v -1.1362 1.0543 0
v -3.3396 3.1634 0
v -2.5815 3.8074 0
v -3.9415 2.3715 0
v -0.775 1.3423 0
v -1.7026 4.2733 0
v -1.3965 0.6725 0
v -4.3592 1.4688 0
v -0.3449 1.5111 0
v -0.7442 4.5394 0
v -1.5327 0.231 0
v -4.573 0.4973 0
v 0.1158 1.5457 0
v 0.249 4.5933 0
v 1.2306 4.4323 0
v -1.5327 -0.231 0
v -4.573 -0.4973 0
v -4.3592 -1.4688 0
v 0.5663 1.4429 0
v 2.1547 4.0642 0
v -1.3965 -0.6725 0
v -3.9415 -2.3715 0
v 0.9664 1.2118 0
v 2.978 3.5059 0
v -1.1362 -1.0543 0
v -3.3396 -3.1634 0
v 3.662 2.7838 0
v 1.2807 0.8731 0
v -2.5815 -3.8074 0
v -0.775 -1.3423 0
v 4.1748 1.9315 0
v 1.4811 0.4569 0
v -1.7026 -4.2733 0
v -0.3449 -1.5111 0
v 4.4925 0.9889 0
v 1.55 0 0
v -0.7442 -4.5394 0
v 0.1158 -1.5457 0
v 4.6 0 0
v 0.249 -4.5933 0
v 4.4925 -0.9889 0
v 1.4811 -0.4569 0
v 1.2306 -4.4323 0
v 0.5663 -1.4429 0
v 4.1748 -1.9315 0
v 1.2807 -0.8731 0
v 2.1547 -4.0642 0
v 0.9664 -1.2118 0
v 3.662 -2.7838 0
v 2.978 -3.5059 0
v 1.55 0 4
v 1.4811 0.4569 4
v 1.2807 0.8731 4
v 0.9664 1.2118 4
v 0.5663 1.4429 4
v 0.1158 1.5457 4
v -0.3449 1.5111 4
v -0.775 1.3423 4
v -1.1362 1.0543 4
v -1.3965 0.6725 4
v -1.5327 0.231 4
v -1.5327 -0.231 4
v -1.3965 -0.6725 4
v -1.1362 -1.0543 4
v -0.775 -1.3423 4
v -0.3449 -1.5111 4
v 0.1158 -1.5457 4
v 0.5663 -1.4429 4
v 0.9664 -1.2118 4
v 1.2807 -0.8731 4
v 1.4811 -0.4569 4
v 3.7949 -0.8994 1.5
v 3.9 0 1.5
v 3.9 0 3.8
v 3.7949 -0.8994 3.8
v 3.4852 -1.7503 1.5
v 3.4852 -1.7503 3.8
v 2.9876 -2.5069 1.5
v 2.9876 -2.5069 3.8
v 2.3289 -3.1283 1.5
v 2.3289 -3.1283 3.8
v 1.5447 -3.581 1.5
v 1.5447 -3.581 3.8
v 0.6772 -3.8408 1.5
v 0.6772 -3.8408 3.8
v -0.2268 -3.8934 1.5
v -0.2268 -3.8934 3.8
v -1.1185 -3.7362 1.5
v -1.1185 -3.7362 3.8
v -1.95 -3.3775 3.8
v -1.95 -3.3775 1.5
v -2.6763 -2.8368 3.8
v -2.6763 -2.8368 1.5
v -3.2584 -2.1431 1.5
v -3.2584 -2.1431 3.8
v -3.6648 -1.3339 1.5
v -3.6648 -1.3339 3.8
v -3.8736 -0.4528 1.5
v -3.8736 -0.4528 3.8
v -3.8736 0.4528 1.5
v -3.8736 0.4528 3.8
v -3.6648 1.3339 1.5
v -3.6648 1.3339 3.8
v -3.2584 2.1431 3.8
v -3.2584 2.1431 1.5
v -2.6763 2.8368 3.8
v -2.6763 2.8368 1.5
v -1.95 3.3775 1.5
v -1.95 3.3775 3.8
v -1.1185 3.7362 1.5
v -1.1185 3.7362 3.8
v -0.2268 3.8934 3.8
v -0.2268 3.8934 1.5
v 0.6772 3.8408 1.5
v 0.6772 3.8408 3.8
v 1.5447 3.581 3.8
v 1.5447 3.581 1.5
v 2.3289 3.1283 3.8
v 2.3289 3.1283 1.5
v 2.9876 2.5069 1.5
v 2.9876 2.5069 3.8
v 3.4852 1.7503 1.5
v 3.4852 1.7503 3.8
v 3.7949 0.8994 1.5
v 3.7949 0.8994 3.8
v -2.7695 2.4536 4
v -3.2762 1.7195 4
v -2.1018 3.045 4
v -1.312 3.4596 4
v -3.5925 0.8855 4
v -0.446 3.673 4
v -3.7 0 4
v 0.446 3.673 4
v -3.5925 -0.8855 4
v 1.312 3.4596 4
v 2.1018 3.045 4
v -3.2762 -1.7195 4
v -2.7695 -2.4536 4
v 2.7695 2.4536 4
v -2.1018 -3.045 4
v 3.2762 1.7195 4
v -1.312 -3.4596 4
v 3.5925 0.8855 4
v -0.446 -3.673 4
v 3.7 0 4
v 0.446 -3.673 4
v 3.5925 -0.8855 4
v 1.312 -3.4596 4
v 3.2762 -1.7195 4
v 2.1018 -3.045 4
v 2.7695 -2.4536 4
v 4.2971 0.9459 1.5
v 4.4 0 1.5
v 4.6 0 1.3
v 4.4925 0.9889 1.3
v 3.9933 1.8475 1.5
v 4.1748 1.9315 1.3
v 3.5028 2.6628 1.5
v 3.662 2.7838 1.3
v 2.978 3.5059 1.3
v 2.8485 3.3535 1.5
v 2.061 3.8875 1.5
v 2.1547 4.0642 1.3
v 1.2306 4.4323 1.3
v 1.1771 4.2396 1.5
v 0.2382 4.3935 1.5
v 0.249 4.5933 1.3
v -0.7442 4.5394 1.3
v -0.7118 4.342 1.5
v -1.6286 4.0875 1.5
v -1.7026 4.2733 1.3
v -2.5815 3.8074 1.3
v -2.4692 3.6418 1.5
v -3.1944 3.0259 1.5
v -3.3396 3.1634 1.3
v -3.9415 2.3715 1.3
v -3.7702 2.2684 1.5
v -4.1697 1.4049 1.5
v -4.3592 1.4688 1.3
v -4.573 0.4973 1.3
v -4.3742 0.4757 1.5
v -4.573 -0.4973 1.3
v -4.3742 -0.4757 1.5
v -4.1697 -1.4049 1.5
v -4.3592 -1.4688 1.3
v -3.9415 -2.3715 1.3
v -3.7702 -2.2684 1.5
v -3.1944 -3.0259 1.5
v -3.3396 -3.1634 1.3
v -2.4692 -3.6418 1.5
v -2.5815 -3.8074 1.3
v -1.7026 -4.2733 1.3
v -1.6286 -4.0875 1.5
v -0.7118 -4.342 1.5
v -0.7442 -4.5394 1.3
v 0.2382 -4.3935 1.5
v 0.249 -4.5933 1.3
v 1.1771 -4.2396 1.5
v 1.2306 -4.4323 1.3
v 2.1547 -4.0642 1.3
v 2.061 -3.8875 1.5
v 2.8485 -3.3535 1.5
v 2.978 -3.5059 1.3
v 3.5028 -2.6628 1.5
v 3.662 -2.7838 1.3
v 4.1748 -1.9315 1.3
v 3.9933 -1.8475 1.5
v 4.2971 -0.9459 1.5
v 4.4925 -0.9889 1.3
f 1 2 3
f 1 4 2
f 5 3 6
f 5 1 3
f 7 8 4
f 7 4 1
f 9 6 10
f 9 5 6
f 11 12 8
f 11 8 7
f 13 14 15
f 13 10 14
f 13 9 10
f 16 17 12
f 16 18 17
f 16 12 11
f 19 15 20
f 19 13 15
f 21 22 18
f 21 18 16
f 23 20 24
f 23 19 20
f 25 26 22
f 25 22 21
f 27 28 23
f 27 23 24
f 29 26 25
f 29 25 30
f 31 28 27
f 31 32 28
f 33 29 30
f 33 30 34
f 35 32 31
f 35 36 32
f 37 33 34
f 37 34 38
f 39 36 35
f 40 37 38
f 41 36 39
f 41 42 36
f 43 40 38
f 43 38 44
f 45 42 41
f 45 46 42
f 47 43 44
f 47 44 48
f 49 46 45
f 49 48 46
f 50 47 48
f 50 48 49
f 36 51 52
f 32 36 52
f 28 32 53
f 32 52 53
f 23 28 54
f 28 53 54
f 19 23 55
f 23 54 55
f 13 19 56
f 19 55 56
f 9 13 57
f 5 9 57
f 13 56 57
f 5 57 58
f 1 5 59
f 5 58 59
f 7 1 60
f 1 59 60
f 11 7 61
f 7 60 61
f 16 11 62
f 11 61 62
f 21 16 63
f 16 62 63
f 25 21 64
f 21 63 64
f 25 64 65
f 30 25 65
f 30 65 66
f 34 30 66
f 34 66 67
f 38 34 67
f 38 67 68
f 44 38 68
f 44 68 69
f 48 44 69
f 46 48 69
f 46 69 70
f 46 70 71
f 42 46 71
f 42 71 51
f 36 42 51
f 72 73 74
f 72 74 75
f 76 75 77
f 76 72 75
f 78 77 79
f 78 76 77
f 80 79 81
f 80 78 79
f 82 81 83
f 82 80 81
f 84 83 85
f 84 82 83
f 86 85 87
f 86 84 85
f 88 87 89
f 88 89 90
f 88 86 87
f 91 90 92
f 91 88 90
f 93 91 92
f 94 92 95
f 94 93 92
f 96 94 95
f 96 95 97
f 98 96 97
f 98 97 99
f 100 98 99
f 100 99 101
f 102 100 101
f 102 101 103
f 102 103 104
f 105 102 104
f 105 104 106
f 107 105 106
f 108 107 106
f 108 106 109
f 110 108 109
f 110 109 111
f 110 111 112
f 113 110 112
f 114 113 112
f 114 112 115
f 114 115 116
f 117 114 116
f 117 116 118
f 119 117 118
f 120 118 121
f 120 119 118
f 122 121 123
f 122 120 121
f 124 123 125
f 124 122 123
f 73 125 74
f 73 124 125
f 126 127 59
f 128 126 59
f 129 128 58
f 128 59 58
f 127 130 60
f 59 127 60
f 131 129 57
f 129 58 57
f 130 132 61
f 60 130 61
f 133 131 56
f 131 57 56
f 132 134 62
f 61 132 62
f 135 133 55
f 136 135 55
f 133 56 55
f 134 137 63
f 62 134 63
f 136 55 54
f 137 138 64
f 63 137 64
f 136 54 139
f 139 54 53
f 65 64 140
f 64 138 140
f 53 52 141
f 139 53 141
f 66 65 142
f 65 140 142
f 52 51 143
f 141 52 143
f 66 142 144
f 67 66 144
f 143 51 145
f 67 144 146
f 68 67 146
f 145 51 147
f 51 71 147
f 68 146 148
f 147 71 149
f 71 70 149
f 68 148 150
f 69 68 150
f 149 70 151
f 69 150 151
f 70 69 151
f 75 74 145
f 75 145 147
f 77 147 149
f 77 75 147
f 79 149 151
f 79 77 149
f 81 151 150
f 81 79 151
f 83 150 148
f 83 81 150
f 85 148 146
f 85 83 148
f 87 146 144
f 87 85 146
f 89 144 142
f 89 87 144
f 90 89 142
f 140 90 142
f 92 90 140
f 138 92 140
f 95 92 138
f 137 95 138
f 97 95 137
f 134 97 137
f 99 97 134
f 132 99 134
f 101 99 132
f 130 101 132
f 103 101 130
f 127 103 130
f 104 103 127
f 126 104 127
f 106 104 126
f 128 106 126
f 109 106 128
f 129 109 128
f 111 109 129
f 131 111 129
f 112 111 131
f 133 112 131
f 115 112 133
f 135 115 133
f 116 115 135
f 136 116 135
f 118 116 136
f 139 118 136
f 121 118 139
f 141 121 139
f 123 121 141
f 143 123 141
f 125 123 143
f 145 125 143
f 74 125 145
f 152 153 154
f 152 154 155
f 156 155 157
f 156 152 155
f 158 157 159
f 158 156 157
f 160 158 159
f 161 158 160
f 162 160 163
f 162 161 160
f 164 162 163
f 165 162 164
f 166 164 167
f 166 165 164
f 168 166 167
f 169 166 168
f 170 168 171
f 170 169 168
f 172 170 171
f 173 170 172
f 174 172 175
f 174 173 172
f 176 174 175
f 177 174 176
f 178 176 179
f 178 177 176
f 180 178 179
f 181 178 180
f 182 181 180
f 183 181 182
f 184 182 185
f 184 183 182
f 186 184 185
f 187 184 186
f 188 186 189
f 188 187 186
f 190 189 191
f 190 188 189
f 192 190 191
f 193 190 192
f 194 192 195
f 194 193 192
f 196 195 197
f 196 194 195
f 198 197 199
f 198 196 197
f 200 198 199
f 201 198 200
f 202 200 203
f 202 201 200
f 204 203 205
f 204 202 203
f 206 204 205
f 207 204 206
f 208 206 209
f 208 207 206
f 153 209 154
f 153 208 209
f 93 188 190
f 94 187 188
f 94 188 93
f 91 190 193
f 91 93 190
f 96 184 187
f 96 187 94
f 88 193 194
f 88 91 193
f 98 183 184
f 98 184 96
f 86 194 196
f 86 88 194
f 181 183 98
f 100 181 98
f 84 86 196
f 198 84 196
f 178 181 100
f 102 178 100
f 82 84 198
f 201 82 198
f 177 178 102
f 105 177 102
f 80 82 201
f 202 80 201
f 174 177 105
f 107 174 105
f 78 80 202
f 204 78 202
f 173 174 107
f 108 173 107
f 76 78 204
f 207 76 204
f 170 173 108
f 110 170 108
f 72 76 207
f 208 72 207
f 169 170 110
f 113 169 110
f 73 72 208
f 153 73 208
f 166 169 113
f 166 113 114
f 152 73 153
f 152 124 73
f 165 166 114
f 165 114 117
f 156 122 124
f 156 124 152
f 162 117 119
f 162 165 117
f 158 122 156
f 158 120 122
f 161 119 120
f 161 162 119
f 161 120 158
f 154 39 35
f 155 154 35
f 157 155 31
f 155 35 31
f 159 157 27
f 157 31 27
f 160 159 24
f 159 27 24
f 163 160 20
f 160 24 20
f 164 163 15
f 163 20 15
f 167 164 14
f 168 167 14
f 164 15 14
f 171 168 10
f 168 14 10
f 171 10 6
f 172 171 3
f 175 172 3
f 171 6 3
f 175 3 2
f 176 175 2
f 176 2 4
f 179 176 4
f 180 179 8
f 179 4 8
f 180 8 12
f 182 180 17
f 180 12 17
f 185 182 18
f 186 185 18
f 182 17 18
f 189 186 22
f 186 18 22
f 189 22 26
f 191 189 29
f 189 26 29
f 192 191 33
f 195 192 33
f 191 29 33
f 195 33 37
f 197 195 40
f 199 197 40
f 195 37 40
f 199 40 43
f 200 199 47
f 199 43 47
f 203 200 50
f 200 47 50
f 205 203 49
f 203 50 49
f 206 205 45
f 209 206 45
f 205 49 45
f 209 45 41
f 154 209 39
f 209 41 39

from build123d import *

# Parameters (mm, degrees)
SKETCH137_R     = 4.6
PAD045_DEPTH    = 1.5
SKETCH138_R     = 3.9
PAD046_DEPTH    = 4
SKETCH139_R     = 1.55
POCKET092_DEPTH = 13
CHAMFER003_SIZE = 0.2


with BuildPart() as part:
    # Sketch137 → Pad045 (new body)
    with BuildSketch(Plane.XY):
        Circle(SKETCH137_R)
    extrude(amount=PAD045_DEPTH)

    # Sketch138 (on Face2 of Pad045) → Pad046 (join)
    with BuildSketch(Plane(origin=(0, 0, 0), x_dir=(1, 0, 0), z_dir=(0, 0, -1))):
        Circle(SKETCH138_R)
    extrude(amount=-PAD046_DEPTH)

    # Sketch139 (on Face4 of Pad046) → Pocket092 (cut)
    with BuildSketch(Plane.XY.offset(4)):
        Circle(SKETCH139_R)
    extrude(amount=-POCKET092_DEPTH, mode=Mode.SUBTRACT)

    # Chamfer003
    chamfer003_edges = [part.edges().sort_by_distance(p)[0] for p in [
        (-3.9, 0, 4),
        (-4.6, 0, 1.5),
    ]]
    chamfer(chamfer003_edges, length=CHAMFER003_SIZE)


solid = part.part
